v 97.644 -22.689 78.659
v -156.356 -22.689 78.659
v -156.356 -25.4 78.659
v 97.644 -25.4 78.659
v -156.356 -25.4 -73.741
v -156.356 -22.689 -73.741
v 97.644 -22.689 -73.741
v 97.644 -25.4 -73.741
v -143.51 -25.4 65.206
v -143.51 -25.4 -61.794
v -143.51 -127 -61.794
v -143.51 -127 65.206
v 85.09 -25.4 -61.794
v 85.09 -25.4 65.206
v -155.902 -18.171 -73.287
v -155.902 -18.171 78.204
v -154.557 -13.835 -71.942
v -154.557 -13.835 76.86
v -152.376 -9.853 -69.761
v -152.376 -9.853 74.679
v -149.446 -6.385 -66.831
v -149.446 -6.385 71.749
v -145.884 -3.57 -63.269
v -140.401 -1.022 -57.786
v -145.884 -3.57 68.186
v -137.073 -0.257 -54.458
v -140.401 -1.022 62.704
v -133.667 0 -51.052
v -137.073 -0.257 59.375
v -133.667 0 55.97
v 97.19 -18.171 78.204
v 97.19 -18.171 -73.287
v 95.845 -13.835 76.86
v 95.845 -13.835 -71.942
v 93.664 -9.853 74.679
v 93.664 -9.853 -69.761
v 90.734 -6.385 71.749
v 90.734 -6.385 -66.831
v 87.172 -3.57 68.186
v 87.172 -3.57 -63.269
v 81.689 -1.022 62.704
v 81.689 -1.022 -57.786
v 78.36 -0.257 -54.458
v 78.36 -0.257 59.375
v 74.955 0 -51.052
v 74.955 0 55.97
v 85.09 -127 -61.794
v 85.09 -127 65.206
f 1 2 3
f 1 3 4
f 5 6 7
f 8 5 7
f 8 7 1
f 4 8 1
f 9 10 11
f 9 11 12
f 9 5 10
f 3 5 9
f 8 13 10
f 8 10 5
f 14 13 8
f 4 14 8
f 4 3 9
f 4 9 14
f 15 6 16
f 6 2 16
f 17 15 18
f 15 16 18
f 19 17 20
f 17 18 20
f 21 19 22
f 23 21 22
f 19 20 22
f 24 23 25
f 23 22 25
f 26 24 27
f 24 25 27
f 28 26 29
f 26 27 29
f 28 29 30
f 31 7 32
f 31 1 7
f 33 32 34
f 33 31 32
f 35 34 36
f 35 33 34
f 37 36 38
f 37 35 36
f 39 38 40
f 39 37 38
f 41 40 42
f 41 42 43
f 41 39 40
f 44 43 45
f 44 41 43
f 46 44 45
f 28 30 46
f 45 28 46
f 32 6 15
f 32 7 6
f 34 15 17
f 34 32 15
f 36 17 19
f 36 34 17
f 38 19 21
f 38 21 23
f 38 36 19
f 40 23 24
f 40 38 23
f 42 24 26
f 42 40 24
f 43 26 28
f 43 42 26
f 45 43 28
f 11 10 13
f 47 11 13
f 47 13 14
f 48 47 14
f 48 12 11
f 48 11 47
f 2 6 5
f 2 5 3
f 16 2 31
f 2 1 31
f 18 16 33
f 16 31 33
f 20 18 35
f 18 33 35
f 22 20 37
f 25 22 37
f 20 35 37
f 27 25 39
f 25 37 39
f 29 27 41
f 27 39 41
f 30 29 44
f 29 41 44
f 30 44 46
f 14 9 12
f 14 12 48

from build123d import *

# Parameters (mm, degrees)
F0_W     = 254
F0_H     = 152.4
F1_DEPTH = 25.4
F2_R     = 22.688779
F3_W     = 228.6
F3_H     = 127
F4_DEPTH = 101.6


with BuildPart() as f1:
    # F0 (on Front) → F1 (new body)
    with BuildSketch(Plane.XZ):
        with Locations((-29.356187, 2.458728)):
            Rectangle(F0_W, F0_H)
    extrude(amount=F1_DEPTH)

    # F2
    f2_edges = [f1.edges().sort_by_distance(p)[0] for p in [
        (-29.356187, 0, 78.658728),
        (-156.356187, 0, 2.458728),
        (-29.356187, 0, -73.741272),
        (97.643813, 0, 2.458728),
    ]]
    fillet(f2_edges, radius=F2_R)

    # F3 (on face) → F4 (join)
    with BuildSketch(Plane.XZ.offset(25.4)):
        with Locations((-29.209957, 1.706252)):
            Rectangle(F3_W, F3_H)
    extrude(amount=F4_DEPTH)


solid = f1.part
